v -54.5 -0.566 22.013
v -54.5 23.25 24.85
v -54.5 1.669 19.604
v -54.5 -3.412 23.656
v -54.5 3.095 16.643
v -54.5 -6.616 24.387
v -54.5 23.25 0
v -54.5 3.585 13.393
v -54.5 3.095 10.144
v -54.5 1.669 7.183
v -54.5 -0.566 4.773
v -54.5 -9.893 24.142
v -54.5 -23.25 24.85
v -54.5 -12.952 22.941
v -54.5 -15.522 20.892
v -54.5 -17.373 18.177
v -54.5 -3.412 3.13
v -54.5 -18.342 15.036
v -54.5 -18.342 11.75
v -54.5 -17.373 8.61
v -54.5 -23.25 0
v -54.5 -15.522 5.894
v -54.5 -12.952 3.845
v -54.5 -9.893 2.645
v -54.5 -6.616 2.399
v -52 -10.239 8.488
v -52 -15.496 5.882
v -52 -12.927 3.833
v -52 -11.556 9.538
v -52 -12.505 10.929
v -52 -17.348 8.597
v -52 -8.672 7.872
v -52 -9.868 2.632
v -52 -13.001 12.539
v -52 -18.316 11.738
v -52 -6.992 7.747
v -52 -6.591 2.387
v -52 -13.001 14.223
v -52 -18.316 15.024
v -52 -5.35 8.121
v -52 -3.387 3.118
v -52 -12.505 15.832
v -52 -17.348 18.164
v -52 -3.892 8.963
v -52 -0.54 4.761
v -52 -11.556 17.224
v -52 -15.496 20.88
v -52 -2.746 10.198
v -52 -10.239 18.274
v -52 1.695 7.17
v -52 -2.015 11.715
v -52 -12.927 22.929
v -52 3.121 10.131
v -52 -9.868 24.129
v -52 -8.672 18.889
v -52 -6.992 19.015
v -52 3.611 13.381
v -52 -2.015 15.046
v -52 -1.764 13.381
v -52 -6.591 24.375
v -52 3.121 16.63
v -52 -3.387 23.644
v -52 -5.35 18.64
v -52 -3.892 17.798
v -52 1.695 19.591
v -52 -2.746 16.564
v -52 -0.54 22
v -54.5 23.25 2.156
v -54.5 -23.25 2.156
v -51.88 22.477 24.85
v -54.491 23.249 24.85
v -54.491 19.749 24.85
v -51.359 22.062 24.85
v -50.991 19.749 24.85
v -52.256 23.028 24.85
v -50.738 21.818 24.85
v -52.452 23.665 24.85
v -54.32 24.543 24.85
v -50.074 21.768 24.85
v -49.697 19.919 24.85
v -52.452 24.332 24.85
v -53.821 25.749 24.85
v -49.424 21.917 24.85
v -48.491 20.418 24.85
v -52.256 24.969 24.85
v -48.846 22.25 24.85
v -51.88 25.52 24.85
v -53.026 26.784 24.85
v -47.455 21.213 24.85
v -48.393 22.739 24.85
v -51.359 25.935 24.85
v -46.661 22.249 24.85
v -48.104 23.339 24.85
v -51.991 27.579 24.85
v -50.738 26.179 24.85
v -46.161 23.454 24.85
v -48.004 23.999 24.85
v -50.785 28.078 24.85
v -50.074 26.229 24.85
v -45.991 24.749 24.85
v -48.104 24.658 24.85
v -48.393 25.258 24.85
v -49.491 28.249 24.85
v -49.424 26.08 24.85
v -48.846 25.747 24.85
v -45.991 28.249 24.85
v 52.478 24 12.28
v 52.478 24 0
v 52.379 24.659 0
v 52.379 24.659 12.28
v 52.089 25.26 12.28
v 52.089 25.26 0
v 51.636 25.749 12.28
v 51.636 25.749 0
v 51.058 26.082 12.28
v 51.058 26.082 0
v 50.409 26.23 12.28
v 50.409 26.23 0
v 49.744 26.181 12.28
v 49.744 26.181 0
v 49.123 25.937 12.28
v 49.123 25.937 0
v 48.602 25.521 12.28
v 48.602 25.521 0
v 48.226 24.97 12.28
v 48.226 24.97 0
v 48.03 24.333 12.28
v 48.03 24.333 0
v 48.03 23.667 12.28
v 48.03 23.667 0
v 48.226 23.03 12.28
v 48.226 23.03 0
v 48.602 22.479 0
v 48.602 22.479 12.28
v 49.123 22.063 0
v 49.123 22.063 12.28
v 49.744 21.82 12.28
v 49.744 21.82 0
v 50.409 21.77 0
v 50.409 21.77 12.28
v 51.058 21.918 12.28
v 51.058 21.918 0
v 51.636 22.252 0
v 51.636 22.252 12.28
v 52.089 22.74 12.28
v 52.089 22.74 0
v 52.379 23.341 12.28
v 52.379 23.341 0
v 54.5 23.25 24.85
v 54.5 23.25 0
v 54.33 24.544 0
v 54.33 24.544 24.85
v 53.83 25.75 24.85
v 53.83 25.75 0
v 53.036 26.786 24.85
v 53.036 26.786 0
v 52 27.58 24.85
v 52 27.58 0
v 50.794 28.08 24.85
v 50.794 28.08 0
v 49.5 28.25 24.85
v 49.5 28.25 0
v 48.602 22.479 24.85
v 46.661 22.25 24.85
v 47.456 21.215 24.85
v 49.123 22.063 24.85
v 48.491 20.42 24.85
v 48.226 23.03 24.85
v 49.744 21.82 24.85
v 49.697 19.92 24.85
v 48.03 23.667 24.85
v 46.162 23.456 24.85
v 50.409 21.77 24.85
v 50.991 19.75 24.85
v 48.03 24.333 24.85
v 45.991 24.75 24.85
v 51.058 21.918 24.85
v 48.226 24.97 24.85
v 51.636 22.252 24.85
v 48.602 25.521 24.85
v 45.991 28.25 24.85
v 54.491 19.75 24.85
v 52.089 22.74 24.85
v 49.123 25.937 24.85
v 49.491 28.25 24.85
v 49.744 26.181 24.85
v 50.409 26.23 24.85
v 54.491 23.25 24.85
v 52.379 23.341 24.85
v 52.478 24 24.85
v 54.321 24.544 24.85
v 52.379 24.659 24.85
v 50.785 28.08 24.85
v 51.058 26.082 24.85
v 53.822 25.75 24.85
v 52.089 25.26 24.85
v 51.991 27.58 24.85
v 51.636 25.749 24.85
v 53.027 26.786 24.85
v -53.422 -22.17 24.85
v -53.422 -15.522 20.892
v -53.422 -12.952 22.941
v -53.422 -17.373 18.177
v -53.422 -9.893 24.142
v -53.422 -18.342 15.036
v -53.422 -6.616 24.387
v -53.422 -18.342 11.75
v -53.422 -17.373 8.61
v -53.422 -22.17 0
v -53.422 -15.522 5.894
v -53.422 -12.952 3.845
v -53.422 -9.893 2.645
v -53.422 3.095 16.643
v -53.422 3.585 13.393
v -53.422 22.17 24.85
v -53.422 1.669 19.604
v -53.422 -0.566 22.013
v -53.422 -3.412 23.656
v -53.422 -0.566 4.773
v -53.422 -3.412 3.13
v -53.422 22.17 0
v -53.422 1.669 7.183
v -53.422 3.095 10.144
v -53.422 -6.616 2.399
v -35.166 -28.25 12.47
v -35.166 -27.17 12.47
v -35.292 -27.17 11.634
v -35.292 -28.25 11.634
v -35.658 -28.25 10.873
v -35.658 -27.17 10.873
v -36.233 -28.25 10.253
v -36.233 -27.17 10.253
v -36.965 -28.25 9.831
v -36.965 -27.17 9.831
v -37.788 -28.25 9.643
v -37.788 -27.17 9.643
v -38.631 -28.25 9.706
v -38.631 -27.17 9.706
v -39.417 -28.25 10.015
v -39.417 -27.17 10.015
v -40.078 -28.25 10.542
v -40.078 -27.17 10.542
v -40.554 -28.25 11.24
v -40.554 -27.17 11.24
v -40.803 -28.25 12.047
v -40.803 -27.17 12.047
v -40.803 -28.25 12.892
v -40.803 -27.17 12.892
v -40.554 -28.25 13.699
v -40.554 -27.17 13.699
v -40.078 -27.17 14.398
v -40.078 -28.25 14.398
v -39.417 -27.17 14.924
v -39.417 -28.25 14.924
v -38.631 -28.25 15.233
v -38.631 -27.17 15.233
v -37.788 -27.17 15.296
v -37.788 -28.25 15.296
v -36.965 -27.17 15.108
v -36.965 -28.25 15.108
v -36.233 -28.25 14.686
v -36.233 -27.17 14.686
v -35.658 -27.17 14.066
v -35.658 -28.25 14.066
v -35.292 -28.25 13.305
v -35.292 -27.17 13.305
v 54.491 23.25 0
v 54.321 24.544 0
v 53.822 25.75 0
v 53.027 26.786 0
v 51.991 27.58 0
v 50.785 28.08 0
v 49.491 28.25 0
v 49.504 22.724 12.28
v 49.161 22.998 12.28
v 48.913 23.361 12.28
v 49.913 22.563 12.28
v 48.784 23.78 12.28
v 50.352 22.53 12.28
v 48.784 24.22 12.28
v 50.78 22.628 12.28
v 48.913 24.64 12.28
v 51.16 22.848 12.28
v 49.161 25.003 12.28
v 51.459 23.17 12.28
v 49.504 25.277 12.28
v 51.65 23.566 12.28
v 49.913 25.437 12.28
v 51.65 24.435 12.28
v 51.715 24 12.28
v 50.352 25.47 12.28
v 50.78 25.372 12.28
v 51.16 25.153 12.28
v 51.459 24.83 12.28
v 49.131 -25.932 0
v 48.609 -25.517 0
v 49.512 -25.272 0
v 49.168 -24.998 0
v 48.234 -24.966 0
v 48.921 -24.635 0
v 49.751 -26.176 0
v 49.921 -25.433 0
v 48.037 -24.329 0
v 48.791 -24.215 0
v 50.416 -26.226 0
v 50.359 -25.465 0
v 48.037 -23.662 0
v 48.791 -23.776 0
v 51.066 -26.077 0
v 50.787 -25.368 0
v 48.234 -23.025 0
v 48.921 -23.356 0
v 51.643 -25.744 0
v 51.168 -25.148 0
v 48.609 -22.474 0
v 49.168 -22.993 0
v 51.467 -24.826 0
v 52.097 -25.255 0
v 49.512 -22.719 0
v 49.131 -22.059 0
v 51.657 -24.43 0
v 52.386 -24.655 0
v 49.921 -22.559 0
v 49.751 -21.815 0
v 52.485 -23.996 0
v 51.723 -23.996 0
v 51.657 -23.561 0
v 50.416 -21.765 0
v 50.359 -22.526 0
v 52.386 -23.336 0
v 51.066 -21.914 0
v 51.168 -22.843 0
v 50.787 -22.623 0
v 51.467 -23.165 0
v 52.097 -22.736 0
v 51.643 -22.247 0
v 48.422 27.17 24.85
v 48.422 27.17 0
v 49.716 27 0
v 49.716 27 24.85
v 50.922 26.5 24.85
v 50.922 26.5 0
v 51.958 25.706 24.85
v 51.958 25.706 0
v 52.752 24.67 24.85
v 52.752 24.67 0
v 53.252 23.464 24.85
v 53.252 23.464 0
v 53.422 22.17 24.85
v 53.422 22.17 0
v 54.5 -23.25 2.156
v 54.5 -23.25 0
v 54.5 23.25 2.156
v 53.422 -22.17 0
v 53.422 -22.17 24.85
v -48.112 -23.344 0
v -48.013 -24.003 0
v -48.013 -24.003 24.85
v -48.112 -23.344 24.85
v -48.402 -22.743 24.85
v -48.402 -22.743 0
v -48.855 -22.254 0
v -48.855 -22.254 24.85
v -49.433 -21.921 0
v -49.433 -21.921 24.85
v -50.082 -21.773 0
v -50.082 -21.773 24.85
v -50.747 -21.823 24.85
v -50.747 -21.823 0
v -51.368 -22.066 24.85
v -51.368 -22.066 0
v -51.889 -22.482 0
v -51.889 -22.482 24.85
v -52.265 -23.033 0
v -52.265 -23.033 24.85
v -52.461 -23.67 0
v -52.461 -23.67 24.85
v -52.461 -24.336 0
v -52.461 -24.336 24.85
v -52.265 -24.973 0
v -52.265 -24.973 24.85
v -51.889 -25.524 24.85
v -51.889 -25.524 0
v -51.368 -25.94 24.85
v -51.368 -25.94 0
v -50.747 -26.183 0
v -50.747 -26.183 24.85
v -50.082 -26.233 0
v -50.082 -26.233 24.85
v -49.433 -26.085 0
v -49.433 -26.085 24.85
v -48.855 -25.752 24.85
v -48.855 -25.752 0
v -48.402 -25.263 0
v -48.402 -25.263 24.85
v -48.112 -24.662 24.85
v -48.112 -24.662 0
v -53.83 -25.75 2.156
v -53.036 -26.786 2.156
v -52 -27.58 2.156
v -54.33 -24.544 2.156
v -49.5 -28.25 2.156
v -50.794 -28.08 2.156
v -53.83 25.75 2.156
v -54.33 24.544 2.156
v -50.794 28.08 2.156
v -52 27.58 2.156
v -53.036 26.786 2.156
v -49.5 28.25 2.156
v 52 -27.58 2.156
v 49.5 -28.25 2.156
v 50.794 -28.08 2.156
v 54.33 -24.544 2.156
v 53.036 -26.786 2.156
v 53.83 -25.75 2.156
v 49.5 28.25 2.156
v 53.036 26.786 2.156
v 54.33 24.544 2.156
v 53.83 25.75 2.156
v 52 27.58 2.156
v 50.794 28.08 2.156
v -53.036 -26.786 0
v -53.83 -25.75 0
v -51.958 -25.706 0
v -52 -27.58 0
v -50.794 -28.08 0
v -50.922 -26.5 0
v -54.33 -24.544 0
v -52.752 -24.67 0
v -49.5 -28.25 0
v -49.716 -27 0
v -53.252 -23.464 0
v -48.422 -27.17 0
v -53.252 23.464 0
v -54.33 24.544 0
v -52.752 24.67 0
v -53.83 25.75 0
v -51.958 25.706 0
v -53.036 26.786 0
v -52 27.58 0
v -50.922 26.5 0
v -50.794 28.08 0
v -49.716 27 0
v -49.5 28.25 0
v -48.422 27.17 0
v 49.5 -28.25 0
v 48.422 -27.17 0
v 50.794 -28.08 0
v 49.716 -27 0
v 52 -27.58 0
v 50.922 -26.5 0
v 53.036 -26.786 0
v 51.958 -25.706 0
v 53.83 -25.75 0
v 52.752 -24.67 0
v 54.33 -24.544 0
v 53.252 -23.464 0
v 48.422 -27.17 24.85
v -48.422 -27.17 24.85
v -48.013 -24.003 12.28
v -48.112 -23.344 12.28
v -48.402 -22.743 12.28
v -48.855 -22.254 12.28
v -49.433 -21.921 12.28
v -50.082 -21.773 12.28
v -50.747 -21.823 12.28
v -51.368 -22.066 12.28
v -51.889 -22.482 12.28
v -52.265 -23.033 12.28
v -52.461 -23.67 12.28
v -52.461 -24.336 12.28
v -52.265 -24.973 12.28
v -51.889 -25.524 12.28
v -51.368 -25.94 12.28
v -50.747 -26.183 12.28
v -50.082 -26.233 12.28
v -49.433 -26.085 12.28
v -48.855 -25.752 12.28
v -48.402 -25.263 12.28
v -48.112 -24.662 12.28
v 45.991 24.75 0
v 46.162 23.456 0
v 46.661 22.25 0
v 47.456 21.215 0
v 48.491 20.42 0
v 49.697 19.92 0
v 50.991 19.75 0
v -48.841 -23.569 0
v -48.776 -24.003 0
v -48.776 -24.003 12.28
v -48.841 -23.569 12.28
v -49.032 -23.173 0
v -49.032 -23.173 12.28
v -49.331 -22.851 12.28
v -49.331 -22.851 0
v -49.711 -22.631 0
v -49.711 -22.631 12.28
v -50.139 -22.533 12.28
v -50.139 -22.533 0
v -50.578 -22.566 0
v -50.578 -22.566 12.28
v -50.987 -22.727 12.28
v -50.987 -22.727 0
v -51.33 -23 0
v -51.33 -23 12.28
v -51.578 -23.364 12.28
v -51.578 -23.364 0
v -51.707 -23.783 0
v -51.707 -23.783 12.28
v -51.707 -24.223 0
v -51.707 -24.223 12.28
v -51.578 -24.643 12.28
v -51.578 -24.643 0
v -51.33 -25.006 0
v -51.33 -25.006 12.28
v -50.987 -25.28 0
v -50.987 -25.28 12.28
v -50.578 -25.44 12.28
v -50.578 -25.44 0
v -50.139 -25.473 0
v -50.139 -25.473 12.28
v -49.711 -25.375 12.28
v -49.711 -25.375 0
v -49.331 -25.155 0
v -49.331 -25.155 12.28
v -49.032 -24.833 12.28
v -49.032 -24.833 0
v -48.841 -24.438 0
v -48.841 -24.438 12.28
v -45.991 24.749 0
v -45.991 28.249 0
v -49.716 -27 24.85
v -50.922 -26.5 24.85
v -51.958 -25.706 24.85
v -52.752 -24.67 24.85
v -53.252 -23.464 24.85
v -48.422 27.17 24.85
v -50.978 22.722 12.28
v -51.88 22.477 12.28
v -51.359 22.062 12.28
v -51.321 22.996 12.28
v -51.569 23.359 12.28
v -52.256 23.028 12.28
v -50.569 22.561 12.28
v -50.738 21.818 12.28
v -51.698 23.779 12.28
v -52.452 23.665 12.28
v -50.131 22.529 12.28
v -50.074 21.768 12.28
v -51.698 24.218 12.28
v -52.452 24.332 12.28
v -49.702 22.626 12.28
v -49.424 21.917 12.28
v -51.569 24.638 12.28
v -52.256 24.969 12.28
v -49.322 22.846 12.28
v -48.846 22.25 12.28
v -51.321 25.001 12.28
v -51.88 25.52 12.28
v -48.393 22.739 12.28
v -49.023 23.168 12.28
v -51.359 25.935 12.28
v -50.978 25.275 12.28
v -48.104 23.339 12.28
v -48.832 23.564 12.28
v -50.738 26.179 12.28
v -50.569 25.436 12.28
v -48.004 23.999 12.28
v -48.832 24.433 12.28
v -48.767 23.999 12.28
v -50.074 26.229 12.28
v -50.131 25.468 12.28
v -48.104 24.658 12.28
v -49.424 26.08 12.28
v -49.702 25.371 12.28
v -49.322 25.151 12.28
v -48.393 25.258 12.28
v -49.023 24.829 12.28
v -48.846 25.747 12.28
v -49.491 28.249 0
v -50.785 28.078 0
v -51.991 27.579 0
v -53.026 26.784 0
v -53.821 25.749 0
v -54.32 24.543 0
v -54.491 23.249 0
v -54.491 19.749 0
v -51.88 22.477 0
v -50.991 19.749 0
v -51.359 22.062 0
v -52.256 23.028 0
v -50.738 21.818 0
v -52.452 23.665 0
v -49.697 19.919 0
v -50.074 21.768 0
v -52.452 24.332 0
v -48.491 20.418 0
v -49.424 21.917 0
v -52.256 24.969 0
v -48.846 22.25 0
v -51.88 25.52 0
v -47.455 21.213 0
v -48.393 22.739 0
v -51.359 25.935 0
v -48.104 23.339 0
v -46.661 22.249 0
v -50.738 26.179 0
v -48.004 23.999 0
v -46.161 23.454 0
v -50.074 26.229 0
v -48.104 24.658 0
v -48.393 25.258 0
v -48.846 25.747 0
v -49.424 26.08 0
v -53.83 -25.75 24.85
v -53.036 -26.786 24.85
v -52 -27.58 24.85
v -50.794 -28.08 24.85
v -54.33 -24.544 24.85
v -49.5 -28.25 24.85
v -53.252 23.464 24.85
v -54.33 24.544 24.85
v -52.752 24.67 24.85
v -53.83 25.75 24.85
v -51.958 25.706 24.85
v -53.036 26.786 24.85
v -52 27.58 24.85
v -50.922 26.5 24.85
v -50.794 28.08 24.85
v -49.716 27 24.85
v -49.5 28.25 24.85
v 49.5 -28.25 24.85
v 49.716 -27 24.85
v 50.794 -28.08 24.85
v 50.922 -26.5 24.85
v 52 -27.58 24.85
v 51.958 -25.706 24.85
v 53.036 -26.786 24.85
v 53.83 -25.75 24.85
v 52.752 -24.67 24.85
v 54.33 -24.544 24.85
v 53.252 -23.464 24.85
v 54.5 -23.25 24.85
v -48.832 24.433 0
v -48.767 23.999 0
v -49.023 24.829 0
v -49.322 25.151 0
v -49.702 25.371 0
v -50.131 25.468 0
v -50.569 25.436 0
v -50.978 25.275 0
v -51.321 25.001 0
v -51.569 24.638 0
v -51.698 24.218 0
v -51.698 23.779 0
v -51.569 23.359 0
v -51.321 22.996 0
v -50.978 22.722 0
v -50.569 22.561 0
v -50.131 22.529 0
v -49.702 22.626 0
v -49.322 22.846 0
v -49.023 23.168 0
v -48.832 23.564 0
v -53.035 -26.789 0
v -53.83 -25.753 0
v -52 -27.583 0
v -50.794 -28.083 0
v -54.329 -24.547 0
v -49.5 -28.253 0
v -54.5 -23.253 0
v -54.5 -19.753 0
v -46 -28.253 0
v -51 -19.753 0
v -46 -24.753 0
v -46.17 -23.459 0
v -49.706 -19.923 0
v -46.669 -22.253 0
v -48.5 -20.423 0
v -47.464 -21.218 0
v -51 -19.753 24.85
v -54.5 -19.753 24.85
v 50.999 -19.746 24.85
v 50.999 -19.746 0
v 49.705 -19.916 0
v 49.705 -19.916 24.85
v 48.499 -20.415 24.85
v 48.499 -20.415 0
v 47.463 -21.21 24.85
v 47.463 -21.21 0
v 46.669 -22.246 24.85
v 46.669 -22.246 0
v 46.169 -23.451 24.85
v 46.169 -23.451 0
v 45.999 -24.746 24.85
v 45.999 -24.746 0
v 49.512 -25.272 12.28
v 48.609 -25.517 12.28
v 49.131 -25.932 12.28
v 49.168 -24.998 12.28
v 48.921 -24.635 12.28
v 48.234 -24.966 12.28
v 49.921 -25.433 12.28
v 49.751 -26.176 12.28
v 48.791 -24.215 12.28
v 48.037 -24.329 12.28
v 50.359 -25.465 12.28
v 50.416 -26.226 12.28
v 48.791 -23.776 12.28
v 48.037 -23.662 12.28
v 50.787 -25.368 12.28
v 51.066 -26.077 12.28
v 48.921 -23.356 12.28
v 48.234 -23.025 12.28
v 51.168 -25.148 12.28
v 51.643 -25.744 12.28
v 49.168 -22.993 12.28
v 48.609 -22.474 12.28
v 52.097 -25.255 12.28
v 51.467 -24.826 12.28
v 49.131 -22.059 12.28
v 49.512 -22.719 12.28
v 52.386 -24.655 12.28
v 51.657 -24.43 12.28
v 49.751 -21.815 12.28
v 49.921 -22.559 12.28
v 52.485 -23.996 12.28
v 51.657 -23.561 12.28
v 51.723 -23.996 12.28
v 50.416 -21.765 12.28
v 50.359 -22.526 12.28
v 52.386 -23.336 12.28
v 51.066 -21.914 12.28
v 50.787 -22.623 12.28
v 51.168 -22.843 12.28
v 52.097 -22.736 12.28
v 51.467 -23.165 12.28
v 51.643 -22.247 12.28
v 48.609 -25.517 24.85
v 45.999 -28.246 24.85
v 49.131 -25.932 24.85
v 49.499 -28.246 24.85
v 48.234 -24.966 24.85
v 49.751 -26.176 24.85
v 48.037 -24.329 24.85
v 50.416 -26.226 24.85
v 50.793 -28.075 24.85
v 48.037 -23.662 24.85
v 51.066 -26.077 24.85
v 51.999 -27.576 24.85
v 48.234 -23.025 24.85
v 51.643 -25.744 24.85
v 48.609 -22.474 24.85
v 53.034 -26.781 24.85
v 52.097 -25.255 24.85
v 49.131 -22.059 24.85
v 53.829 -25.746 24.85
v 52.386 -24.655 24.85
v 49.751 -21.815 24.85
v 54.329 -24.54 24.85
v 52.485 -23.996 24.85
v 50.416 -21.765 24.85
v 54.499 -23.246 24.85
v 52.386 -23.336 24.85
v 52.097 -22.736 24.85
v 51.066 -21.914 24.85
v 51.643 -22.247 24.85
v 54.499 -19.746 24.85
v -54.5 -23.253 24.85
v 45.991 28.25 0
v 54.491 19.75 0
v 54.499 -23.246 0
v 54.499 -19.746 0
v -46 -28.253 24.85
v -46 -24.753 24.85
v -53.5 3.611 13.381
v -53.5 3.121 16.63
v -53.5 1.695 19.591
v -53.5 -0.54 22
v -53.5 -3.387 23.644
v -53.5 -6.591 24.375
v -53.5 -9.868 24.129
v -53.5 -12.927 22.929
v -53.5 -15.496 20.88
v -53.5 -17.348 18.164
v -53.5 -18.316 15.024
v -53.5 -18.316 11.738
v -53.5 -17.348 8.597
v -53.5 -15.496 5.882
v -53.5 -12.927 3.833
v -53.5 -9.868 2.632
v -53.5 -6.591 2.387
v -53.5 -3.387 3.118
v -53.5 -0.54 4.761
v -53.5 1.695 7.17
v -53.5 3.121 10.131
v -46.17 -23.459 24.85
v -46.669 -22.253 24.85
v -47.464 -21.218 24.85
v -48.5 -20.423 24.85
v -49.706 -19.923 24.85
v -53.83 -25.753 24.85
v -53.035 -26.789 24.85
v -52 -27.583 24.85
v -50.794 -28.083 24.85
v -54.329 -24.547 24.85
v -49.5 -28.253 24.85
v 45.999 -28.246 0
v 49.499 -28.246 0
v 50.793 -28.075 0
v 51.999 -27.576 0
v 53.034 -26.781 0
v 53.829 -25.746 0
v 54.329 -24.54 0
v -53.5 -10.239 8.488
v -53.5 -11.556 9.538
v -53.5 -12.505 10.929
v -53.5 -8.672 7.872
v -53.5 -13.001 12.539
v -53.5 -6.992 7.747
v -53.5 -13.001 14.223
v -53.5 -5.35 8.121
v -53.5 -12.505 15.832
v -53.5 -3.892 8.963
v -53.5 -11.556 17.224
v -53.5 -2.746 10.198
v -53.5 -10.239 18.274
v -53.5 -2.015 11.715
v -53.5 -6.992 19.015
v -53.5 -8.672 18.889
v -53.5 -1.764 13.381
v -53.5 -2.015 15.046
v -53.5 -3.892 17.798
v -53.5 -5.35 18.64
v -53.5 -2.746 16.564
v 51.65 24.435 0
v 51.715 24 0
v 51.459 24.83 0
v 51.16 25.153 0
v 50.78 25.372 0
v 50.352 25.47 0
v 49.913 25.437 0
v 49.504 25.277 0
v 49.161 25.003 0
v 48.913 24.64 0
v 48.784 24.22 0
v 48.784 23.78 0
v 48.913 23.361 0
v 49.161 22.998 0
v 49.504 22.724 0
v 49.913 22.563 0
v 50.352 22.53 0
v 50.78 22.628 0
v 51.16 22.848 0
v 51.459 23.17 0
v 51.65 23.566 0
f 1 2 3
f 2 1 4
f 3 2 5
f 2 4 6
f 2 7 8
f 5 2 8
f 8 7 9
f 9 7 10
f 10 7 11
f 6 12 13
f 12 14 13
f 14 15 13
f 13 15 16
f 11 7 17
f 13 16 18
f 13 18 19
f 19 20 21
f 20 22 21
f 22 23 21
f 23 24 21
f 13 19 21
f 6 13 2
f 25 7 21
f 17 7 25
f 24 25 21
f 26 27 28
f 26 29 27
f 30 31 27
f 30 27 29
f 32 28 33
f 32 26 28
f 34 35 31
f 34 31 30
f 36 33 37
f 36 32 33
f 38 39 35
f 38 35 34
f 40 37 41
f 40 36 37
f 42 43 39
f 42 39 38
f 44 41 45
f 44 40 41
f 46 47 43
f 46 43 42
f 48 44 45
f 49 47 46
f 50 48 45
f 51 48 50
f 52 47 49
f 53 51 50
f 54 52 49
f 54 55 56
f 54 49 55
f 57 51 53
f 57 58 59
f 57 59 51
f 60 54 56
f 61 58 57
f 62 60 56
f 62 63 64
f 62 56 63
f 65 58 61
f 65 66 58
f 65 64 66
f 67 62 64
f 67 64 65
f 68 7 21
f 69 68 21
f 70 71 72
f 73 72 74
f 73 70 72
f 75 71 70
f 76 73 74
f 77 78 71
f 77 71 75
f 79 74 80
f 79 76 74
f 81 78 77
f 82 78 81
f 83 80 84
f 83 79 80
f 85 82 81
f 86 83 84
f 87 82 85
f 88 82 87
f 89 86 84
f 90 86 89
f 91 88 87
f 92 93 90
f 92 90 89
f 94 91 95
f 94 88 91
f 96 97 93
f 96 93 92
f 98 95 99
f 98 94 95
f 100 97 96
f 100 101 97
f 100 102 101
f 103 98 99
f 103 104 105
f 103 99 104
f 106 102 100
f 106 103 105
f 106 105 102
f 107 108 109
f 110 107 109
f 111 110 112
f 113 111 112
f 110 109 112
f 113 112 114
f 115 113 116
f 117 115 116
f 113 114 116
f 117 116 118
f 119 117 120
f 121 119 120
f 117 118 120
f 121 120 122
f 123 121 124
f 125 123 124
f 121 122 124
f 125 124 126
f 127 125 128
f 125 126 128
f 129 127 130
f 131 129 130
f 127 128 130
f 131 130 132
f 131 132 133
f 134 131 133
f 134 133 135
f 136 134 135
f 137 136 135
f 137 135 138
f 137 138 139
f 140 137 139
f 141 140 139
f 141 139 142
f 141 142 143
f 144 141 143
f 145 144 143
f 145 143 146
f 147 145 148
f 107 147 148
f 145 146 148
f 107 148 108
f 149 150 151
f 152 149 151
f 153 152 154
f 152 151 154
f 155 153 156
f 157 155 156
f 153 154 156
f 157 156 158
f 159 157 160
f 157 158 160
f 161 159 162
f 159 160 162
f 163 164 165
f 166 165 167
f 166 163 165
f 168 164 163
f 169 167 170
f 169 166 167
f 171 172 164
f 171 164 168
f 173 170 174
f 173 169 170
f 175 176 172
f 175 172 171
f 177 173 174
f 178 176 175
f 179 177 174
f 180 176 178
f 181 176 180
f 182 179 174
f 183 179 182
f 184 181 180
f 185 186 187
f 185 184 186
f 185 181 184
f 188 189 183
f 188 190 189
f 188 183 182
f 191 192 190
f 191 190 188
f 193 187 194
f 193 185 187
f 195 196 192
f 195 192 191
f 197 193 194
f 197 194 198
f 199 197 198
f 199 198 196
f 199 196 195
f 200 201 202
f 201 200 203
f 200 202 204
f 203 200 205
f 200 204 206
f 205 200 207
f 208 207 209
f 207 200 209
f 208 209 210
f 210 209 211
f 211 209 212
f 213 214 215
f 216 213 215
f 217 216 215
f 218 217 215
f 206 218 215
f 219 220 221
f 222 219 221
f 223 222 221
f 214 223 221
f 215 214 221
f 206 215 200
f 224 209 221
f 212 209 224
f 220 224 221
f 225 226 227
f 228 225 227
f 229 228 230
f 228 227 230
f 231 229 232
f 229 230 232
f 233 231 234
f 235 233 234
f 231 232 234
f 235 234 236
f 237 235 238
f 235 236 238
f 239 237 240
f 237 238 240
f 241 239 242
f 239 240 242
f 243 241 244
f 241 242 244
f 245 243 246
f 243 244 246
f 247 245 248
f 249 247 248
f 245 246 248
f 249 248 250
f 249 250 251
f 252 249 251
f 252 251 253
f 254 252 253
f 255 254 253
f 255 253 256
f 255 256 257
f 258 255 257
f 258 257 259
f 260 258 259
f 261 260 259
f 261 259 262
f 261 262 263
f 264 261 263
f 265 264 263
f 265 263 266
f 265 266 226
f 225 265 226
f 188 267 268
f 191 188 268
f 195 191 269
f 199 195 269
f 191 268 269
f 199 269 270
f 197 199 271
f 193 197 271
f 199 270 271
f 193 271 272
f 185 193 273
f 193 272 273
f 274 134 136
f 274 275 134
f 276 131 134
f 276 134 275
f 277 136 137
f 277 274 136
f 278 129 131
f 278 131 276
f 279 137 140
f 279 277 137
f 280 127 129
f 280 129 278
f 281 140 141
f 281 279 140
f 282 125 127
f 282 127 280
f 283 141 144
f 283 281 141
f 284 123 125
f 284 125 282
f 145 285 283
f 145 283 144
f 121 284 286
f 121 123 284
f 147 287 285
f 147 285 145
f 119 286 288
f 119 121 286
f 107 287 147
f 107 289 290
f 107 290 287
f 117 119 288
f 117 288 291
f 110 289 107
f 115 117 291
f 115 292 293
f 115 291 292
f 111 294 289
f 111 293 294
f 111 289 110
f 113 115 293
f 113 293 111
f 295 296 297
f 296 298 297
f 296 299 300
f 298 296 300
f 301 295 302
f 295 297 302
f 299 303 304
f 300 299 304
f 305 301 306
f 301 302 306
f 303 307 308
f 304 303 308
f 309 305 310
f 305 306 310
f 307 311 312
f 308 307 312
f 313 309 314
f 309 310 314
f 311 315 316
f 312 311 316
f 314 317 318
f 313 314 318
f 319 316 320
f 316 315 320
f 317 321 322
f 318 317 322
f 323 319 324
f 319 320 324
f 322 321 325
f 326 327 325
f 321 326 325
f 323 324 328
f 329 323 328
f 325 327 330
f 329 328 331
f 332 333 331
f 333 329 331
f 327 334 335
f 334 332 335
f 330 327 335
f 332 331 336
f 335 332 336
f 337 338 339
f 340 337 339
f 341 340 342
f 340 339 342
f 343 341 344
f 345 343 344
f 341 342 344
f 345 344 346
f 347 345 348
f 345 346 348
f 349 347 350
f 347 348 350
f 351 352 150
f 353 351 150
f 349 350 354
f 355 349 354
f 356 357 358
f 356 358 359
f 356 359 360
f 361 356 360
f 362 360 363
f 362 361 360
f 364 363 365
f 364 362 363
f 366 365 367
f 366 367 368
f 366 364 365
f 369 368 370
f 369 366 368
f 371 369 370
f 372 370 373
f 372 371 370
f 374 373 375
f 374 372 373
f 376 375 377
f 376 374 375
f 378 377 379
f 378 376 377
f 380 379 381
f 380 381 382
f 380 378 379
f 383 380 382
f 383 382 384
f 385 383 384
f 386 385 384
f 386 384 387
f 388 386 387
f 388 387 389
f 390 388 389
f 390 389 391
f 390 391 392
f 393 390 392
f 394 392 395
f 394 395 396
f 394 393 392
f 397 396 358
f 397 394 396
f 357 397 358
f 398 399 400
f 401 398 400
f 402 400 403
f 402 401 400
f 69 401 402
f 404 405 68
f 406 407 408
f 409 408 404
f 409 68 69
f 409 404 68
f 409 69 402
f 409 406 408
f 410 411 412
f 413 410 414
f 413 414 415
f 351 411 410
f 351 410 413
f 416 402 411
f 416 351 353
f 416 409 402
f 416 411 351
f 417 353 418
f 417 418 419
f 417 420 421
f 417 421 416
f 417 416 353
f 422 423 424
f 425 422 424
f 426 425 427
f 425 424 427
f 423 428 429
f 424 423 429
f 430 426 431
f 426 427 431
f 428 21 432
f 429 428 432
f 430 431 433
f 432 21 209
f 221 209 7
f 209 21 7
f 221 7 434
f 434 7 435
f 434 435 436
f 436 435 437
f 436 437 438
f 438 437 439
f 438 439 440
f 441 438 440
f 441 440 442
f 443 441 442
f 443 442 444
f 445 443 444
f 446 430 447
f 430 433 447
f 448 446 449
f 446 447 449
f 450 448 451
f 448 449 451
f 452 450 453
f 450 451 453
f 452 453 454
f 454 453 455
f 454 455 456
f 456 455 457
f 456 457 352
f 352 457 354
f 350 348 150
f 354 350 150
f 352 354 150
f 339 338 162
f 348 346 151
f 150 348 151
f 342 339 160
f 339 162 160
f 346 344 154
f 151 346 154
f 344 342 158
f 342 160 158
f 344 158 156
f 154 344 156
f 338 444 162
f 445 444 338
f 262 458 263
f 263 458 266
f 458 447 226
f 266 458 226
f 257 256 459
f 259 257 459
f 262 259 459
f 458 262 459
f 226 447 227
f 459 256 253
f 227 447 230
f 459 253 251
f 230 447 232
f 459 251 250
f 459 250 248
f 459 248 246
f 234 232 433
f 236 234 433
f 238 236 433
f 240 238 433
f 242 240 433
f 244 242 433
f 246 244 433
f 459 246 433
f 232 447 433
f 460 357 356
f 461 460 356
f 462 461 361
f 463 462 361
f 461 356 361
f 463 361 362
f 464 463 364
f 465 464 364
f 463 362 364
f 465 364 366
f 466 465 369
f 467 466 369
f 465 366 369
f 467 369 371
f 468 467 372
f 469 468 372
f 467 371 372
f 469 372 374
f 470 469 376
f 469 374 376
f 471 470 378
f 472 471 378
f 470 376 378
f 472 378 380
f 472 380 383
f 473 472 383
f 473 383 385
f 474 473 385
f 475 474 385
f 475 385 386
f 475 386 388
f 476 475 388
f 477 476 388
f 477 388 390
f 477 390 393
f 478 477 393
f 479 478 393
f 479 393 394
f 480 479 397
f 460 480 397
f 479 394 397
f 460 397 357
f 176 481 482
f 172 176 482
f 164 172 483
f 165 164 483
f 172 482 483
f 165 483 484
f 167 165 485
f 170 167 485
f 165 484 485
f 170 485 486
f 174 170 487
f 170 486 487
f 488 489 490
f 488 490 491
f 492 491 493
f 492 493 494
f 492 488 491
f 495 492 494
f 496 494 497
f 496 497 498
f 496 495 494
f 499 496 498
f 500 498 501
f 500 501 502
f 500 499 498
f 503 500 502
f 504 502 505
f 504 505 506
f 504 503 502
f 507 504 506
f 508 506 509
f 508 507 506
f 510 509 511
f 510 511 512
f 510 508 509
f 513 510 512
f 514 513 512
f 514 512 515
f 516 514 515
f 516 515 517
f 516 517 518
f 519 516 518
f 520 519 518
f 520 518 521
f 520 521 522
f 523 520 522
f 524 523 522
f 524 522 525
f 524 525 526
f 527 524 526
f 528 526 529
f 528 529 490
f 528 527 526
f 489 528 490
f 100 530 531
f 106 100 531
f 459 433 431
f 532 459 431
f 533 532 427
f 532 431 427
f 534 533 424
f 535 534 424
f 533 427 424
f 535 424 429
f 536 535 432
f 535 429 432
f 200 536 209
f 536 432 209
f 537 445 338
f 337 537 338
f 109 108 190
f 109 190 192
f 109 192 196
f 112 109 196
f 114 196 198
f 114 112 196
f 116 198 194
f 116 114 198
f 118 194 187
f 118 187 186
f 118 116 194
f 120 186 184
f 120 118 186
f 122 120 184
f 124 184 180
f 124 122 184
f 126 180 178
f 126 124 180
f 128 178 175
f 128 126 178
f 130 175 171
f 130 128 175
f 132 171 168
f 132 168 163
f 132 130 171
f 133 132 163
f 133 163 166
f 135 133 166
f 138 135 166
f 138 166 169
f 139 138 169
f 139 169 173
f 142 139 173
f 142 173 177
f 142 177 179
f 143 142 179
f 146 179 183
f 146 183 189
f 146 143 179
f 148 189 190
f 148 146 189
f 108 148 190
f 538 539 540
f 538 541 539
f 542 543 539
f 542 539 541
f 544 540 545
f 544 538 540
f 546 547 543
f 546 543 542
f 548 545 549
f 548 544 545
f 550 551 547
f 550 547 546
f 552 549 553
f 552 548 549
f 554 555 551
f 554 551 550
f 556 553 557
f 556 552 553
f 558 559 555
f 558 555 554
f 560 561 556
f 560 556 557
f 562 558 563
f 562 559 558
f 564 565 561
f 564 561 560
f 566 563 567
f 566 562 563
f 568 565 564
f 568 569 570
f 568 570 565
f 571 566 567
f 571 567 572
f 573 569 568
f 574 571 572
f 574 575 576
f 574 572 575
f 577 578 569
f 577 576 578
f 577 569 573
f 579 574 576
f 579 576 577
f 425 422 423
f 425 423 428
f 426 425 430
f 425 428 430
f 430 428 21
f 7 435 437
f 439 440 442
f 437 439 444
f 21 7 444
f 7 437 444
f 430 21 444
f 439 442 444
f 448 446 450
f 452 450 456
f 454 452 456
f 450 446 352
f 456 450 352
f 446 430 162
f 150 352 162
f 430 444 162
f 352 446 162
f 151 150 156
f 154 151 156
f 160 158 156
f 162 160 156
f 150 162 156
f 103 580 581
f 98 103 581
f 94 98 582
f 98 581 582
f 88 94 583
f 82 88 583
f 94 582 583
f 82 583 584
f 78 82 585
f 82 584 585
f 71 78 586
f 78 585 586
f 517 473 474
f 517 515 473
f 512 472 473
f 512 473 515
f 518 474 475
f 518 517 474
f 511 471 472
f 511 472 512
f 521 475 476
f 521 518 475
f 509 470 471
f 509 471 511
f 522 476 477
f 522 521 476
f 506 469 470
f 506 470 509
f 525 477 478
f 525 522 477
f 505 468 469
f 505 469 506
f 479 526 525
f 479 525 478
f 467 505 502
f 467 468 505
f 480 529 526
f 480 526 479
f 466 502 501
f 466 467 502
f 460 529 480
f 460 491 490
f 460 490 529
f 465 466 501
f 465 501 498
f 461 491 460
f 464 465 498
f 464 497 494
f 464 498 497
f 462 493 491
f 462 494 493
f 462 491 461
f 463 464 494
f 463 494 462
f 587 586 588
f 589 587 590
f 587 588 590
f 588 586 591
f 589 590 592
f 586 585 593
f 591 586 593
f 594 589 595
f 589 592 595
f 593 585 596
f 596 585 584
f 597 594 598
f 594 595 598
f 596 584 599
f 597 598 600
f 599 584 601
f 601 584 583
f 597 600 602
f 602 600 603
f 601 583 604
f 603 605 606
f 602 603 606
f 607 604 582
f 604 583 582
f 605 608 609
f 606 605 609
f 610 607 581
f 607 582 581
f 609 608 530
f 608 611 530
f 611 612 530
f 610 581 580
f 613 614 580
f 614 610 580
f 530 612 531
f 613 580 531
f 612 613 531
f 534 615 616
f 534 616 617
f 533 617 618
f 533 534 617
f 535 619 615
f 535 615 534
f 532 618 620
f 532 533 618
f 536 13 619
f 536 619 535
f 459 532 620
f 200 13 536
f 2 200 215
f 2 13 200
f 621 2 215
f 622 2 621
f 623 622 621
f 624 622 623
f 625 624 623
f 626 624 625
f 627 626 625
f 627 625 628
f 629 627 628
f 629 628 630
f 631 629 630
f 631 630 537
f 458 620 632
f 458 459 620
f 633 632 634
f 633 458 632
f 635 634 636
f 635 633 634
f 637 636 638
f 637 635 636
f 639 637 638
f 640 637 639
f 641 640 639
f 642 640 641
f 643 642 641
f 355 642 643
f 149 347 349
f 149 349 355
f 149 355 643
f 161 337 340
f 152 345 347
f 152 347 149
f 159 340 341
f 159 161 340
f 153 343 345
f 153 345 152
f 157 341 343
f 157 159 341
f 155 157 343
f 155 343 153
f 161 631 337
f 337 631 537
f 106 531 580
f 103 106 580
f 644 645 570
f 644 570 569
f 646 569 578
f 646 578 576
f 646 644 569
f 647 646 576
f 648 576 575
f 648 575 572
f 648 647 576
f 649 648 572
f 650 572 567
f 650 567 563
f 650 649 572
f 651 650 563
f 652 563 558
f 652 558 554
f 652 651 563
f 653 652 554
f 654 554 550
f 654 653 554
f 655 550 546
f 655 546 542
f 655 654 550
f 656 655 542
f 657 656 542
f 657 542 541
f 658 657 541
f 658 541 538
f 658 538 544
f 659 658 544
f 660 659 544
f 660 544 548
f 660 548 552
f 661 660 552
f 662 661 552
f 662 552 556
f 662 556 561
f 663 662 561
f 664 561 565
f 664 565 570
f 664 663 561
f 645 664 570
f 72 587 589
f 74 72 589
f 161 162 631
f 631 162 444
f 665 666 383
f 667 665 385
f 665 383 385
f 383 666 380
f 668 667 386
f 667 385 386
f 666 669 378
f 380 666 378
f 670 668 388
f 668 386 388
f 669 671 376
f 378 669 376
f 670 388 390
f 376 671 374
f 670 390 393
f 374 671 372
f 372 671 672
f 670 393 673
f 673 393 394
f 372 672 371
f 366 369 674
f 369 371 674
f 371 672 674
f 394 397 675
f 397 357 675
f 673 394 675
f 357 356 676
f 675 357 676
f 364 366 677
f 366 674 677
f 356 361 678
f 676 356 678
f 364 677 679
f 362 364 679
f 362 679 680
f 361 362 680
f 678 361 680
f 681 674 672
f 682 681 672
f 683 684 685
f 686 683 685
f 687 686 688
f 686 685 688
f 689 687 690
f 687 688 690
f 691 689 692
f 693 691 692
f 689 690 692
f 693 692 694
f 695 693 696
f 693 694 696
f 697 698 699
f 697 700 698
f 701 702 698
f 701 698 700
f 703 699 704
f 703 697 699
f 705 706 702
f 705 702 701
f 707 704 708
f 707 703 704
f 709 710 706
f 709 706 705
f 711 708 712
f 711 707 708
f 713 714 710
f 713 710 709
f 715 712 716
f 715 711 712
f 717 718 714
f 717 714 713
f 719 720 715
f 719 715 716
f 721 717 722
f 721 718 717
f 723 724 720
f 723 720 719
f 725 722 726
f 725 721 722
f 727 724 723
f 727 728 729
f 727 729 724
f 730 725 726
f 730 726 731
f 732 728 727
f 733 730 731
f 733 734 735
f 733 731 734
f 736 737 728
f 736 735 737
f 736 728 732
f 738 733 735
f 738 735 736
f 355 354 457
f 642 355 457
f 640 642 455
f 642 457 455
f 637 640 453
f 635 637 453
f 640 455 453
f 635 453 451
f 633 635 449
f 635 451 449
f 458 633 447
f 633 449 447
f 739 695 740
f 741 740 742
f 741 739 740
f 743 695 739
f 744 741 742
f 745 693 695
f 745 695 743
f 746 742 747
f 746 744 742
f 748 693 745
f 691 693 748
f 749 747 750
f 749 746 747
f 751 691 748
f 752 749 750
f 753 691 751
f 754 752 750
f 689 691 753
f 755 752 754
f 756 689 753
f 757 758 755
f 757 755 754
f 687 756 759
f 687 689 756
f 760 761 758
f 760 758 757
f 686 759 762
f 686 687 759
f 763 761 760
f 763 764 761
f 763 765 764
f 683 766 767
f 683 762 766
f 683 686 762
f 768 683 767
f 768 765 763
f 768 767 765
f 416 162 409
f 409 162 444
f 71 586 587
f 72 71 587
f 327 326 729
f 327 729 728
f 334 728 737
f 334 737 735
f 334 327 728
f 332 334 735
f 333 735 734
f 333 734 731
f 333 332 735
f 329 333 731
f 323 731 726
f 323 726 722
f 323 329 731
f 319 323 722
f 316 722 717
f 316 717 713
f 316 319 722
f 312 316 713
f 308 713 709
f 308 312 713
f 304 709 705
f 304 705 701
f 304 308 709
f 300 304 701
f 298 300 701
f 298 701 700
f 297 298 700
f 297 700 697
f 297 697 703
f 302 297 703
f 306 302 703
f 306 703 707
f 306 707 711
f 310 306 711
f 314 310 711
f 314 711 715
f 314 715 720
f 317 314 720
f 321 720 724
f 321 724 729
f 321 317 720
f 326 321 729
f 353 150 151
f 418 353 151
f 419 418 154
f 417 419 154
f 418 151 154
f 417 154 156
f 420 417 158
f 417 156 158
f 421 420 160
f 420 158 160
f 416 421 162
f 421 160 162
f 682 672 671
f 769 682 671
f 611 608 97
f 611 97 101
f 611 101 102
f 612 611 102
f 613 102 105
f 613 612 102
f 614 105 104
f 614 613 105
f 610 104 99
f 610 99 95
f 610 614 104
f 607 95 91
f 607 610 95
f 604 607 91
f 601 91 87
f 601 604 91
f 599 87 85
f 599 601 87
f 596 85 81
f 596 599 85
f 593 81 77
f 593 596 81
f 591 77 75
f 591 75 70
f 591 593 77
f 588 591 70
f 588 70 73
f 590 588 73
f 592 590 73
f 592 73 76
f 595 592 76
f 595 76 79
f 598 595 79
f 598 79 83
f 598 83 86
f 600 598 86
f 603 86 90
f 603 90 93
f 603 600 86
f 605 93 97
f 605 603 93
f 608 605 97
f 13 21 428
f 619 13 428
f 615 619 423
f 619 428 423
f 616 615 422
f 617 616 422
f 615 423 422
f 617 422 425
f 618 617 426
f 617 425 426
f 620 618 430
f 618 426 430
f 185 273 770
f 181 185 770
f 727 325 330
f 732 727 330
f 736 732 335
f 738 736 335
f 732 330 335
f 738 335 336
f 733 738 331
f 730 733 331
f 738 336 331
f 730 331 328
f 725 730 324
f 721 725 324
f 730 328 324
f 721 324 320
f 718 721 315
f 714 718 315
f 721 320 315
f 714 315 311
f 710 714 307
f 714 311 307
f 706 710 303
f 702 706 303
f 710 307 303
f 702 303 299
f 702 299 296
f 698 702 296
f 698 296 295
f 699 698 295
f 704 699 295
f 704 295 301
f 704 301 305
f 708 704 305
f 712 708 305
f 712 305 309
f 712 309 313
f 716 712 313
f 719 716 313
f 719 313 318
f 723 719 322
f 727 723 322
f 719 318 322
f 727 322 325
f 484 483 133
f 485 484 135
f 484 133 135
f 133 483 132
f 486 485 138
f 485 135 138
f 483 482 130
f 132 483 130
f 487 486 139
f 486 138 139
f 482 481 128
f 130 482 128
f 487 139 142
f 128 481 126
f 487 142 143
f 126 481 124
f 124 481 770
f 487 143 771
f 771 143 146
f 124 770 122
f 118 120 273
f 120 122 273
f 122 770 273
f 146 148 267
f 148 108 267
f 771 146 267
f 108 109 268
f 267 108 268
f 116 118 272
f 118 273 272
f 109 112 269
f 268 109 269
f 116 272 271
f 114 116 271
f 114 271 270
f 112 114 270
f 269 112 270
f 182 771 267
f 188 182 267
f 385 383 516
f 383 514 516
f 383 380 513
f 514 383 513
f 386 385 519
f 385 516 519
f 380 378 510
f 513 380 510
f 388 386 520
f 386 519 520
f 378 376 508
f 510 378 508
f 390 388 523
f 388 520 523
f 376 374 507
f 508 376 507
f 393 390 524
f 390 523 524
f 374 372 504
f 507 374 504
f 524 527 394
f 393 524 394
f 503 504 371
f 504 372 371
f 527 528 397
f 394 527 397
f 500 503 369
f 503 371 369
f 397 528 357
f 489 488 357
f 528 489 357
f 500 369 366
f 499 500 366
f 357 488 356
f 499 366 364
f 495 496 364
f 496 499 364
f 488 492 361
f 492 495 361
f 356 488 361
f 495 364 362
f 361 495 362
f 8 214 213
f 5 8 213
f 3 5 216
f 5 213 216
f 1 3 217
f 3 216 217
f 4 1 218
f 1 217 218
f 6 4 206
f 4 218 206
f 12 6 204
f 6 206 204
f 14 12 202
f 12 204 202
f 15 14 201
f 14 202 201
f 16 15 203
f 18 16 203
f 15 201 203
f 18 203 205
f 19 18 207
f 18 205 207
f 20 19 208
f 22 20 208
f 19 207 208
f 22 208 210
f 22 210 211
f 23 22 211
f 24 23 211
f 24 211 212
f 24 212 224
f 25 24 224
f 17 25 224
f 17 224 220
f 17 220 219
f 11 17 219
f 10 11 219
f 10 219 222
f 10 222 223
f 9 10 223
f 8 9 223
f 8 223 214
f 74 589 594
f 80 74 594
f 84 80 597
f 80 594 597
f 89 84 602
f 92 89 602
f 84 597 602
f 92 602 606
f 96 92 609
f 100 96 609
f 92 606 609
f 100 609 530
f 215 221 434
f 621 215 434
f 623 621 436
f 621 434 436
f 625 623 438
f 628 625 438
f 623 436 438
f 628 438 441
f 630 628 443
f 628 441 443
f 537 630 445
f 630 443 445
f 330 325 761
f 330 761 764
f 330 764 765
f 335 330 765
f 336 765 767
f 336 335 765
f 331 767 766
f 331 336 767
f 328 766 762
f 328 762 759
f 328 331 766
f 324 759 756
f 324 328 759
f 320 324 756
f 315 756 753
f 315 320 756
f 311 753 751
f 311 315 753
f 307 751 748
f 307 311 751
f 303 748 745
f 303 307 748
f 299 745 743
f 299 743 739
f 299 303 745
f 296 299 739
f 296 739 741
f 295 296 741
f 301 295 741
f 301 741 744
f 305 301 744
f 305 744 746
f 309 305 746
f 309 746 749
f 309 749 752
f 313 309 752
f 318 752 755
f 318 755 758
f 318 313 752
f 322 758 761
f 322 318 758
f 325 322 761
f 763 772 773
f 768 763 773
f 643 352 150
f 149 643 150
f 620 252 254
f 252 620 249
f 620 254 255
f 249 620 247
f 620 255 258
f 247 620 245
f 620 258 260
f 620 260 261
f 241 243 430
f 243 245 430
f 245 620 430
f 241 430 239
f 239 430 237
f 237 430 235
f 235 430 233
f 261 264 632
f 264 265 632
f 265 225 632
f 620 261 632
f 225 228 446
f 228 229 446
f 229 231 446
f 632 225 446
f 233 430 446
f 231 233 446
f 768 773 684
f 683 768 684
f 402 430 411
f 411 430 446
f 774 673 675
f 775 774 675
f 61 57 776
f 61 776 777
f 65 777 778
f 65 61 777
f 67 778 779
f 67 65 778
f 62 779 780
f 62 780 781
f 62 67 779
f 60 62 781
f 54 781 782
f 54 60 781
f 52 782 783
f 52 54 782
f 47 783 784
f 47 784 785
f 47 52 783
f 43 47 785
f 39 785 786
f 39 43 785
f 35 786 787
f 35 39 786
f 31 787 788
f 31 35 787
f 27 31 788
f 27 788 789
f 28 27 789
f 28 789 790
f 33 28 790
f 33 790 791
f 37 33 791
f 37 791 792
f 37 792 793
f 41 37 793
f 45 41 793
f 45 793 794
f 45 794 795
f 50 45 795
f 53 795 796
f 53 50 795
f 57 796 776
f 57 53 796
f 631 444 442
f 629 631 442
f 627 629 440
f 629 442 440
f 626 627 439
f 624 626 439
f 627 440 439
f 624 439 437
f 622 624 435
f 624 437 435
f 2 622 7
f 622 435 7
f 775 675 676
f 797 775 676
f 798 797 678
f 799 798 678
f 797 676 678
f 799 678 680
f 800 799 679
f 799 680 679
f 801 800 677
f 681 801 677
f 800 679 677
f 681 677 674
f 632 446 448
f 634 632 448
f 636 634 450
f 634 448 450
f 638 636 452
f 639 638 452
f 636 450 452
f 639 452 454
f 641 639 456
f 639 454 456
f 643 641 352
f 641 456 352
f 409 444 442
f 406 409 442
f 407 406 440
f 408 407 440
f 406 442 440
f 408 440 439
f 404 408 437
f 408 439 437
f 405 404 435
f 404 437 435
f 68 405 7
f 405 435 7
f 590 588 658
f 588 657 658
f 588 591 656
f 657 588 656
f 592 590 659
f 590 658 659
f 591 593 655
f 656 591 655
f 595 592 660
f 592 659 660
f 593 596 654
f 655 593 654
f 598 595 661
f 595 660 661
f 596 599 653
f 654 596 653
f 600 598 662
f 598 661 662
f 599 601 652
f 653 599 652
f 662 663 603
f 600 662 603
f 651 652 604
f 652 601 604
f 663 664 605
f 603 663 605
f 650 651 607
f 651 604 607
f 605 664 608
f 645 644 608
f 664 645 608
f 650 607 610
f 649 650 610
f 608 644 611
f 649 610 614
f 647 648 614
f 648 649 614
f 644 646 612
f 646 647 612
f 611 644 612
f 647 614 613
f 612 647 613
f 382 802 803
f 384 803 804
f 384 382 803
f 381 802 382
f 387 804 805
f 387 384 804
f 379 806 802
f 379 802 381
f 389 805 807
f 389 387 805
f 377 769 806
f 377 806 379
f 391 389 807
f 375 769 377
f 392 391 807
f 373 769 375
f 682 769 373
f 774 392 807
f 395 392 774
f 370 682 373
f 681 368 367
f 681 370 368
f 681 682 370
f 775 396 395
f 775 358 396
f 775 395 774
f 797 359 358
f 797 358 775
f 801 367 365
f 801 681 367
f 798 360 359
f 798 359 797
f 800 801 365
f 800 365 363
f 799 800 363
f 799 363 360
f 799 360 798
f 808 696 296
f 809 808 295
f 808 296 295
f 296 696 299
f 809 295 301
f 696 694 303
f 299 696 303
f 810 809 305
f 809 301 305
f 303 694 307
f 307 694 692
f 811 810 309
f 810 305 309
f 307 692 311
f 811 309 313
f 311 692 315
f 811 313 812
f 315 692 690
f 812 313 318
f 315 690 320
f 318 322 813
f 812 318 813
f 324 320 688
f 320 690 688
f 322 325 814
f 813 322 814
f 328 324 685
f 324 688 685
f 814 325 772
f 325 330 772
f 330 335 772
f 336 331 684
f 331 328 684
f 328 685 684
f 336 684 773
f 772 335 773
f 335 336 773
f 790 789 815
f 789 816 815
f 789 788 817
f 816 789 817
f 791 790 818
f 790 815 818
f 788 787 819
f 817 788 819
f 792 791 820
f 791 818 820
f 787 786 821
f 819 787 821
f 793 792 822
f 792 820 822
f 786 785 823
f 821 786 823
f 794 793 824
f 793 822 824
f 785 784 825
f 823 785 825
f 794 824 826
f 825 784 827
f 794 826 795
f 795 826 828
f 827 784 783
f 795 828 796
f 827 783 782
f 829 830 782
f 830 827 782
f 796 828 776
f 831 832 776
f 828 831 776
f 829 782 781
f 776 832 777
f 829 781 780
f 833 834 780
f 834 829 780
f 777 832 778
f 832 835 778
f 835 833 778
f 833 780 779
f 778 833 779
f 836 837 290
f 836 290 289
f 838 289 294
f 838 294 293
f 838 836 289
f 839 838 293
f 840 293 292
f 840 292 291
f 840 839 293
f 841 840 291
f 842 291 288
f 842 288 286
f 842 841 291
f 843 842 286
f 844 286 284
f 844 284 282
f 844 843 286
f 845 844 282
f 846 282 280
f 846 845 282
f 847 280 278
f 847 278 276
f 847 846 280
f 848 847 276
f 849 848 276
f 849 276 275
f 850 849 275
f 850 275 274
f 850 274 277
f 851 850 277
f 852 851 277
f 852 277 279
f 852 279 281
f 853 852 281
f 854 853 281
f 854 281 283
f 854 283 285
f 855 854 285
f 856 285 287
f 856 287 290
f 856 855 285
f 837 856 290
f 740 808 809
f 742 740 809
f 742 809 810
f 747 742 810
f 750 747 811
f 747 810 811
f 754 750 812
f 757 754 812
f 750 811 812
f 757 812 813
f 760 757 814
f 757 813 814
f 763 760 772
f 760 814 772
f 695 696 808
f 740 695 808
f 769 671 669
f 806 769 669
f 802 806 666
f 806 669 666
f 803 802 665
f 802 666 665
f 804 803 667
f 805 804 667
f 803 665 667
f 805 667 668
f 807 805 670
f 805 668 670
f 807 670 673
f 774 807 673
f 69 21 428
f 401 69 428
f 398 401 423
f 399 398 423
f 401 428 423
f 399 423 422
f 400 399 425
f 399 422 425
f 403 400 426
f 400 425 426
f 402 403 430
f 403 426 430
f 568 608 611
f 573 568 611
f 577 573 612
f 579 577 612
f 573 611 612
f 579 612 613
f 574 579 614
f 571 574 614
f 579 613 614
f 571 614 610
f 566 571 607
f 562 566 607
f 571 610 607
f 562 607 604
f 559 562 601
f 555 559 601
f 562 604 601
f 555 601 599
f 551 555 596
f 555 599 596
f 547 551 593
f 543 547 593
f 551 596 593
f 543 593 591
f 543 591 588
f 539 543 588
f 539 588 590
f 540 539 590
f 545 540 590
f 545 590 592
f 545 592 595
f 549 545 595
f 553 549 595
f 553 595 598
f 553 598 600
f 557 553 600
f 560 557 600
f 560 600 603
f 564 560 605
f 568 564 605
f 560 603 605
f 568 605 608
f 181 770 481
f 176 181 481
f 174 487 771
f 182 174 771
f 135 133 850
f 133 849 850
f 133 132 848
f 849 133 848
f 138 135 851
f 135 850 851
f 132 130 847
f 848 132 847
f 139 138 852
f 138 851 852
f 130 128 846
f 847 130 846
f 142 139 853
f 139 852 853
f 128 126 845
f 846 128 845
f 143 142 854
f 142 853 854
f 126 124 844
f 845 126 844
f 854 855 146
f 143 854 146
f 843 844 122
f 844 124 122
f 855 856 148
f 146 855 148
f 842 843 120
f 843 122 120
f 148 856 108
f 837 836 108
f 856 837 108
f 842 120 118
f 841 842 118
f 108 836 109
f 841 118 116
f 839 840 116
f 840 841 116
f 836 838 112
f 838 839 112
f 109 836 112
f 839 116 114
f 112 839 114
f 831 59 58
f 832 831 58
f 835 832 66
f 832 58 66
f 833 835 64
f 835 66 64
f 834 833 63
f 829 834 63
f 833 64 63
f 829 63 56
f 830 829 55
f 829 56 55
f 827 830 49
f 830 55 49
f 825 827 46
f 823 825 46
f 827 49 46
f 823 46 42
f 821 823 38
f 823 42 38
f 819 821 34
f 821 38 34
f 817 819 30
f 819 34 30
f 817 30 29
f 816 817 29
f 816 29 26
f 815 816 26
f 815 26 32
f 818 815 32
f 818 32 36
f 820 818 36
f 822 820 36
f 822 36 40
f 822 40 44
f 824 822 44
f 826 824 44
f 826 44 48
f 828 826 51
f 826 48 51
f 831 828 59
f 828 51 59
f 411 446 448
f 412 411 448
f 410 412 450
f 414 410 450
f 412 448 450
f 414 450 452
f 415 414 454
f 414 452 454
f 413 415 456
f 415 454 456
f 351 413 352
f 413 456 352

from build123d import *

# Parameters (mm, degrees)
F1_DEPTH  = 2.156
F3_DEPTH  = 24.85
F4_R      = 2.2365
F5_DEPTH  = 24.85
F6_R      = 2.2365
F6_R_2    = 1.474
F7_DEPTH  = 12.28
F9_D      = 5.669
F9_DEPTH  = 28.251
F11_D     = 22.05
F11_DEPTH = 54.501
F12_R     = 11.025
F12_R_2   = 5.65
F13_DEPTH = 1.5


with BuildPart() as f1:
    # F0 (on Top) → F1 (new body)
    with BuildSketch(Plane.XY):
        with BuildLine():
            Line((-49.5, -28.25), (49.5, -28.25))
            ThreePointArc((49.5, -28.25), (53.0355339059, -26.7855339059), (54.5, -23.25))
            Line((54.5, -23.25), (54.5, 23.25))
            ThreePointArc((54.5, 23.25), (53.0355339059, 26.7855339059), (49.5, 28.25))
            Line((49.5, 28.25), (-49.5, 28.25))
            ThreePointArc((-49.5, 28.25), (-53.0355339059, 26.7855339059), (-54.5, 23.25))
            Line((-54.5, 23.25), (-54.5, -23.25))
            ThreePointArc((-54.5, -23.25), (-53.0355339059, -26.7855339059), (-49.5, -28.25))
        make_face()
    extrude(amount=F1_DEPTH)


with BuildPart() as f3:
    # F2 (on Top) → F3 (new body)
    with BuildSketch(Plane.XY):
        with BuildLine():
            Line((-49.5, -28.25), (49.5, -28.25))
            ThreePointArc((49.5, -28.25), (53.0355339059, -26.7855339059), (54.5, -23.25))
            Line((54.5, -23.25), (54.5, 23.25))
            ThreePointArc((54.5, 23.25), (53.0355339059, 26.7855339059), (49.5, 28.25))
            Line((49.5, 28.25), (-49.5, 28.25))
            ThreePointArc((-49.5, 28.25), (-53.0355339059, 26.7855339059), (-54.5, 23.25))
            Line((-54.5, 23.25), (-54.5, -23.25))
            ThreePointArc((-54.5, -23.25), (-53.0355339059, -26.7855339059), (-49.5, -28.25))
        make_face()
        with BuildLine():
            Line((-48.422, 27.17), (48.422, 27.17))
            ThreePointArc((48.422, 27.17), (51.9575339059, 25.7055339059), (53.422, 22.17))
            Line((53.422, 22.17), (53.422, -22.17))
            ThreePointArc((53.422, -22.17), (51.9575339059, -25.7055339059), (48.422, -27.17))
            Line((48.422, -27.17), (-48.422, -27.17))
            ThreePointArc((-48.422, -27.17), (-51.9575339059, -25.7055339059), (-53.422, -22.17))
            Line((-53.422, -22.17), (-53.422, 22.17))
            ThreePointArc((-53.422, 22.17), (-51.9575339059, 25.7055339059), (-48.422, 27.17))
        make_face(mode=Mode.SUBTRACT)
    extrude(amount=F3_DEPTH)

    # F9 (through all, one way)
    with BuildSketch(Plane(origin=(0, 0, 0), x_dir=(1, 0, 0), z_dir=(0, 1, 0))):
        with Locations((-38.0002260208, -12.4695785344)):
            Circle(F9_D / 2)
    extrude(amount=-F9_DEPTH, mode=Mode.SUBTRACT)

    # F11 (through all, one way)
    with BuildSketch(Plane.YZ):
        with Locations((-7.439928595, 13.3931897581)):
            Circle(F11_D / 2)
    extrude(amount=-F11_DEPTH, mode=Mode.SUBTRACT)


with BuildPart() as f5:
    # F4 (on Top) → F5 (new body)
    with BuildSketch(Plane.XY):
        with BuildLine():
            Line((45.9988752827, -28.245583877), (49.4988752827, -28.245583877))
            ThreePointArc((49.4988752827, -28.245583877), (53.0344091886, -26.7811177829), (54.4988752827, -23.245583877))
            Line((54.4988752827, -23.245583877), (54.4988752827, -19.745583877))
            Line((54.4988752827, -19.745583877), (50.9988752827, -19.745583877))
            ThreePointArc((50.9988752827, -19.745583877), (47.4633413768, -21.210049971), (45.9988752827, -24.745583877))
            Line((45.9988752827, -24.745583877), (45.9988752827, -28.245583877))
        make_face()
        with Locations((50.2488752827, -23.995583877)):
            Circle(F4_R, mode=Mode.SUBTRACT)
    extrude(amount=F5_DEPTH)


with BuildPart() as f5b:
    # F4 (on Top) → F5, piece 2 (new body)
    with BuildSketch(Plane.XY):
        with BuildLine():
            Line((50.9913948998, 19.7500952035), (54.4913948998, 19.7500952035))
            Line((54.4913948998, 19.7500952035), (54.4913948998, 23.2500952035))
            ThreePointArc((54.4913948998, 23.2500952035), (53.0269288057, 26.7856291095), (49.4913948998, 28.2500952035))
            Line((49.4913948998, 28.2500952035), (45.9913948998, 28.2500952035))
            Line((45.9913948998, 28.2500952035), (45.9913948998, 24.7500952035))
            ThreePointArc((45.9913948998, 24.7500952035), (47.4558609939, 21.2145612976), (50.9913948998, 19.7500952035))
        make_face()
        with Locations((50.2413948998, 24.0000952035)):
            Circle(F4_R, mode=Mode.SUBTRACT)
    extrude(amount=F5_DEPTH)


with BuildPart() as f5c:
    # F4 (on Top) → F5, piece 3 (new body)
    with BuildSketch(Plane.XY):
        with BuildLine():
            Line((-49.4995961264, -28.2530474961), (-45.9995961264, -28.2530474961))
            Line((-45.9995961264, -28.2530474961), (-45.9995961264, -24.7530474961))
            ThreePointArc((-45.9995961264, -24.7530474961), (-47.4640622204, -21.2175135901), (-50.9995961264, -19.7530474961))
            Line((-50.9995961264, -19.7530474961), (-54.4995961264, -19.7530474961))
            Line((-54.4995961264, -19.7530474961), (-54.4995961264, -23.2530474961))
            ThreePointArc((-54.4995961264, -23.2530474961), (-53.0351300323, -26.788581402), (-49.4995961264, -28.2530474961))
        make_face()
        with Locations((-50.2495961264, -24.0030474961)):
            Circle(F4_R, mode=Mode.SUBTRACT)
    extrude(amount=F5_DEPTH)


with BuildPart() as f5d:
    # F4 (on Top) → F5, piece 4 (new body)
    with BuildSketch(Plane.XY):
        with BuildLine():
            Line((-54.4906740561, 19.7485361695), (-50.9906740561, 19.7485361695))
            ThreePointArc((-50.9906740561, 19.7485361695), (-47.4551401502, 21.2130022636), (-45.9906740561, 24.7485361695))
            Line((-45.9906740561, 24.7485361695), (-45.9906740561, 28.2485361695))
            Line((-45.9906740561, 28.2485361695), (-49.4906740561, 28.2485361695))
            ThreePointArc((-49.4906740561, 28.2485361695), (-53.026207962, 26.7840700755), (-54.4906740561, 23.2485361695))
            Line((-54.4906740561, 23.2485361695), (-54.4906740561, 19.7485361695))
        make_face()
        with Locations((-50.2406740561, 23.9985361695)):
            Circle(F4_R, mode=Mode.SUBTRACT)
    extrude(amount=F5_DEPTH)


with BuildPart() as f7:
    # F6 (on Top) → F7 (new body)
    with BuildSketch(Plane.XY):
        with Locations((-50.2406740561, 23.9985361695)):
            Circle(F6_R)
        with Locations((-50.2406740561, 23.9985361695)):
            Circle(F6_R_2, mode=Mode.SUBTRACT)
    extrude(amount=F7_DEPTH)


with BuildPart() as f7b:
    # F6 (on Top) → F7, piece 2 (new body)
    with BuildSketch(Plane.XY):
        with Locations((50.2413948998, 24.0000952035)):
            Circle(F6_R)
        with Locations((50.2413948998, 24.0000952035)):
            Circle(F6_R_2, mode=Mode.SUBTRACT)
    extrude(amount=F7_DEPTH)


with BuildPart() as f7c:
    # F6 (on Top) → F7, piece 3 (new body)
    with BuildSketch(Plane.XY):
        with Locations((50.2488752827, -23.995583877)):
            Circle(F6_R)
        with Locations((50.2488752827, -23.995583877)):
            Circle(F6_R_2, mode=Mode.SUBTRACT)
    extrude(amount=F7_DEPTH)


with BuildPart() as f7d:
    # F6 (on Top) → F7, piece 4 (new body)
    with BuildSketch(Plane.XY):
        with Locations((-50.2495961264, -24.0030474961)):
            Circle(F6_R)
        with Locations((-50.2495961264, -24.0030474961)):
            Circle(F6_R_2, mode=Mode.SUBTRACT)
    extrude(amount=F7_DEPTH)


with BuildPart() as f13:
    # F12 (on Right) → F13 (new body)
    with BuildSketch(Plane.YZ):
        with Locations((-7.4144070968, 13.3807938546)):
            Circle(F12_R)
        with Locations((-7.4144070968, 13.3807938546)):
            Circle(F12_R_2, mode=Mode.SUBTRACT)
    extrude(amount=-F13_DEPTH)


with BuildPart() as f13_1:
    # F14: moved
    add(f13.part.moved(Location((-52, 0, 0))))


solid = Compound([f1.part, f3.part, f5.part, f5b.part, f5c.part, f5d.part, f7.part, f7b.part, f7c.part, f7d.part, f13_1.part])
